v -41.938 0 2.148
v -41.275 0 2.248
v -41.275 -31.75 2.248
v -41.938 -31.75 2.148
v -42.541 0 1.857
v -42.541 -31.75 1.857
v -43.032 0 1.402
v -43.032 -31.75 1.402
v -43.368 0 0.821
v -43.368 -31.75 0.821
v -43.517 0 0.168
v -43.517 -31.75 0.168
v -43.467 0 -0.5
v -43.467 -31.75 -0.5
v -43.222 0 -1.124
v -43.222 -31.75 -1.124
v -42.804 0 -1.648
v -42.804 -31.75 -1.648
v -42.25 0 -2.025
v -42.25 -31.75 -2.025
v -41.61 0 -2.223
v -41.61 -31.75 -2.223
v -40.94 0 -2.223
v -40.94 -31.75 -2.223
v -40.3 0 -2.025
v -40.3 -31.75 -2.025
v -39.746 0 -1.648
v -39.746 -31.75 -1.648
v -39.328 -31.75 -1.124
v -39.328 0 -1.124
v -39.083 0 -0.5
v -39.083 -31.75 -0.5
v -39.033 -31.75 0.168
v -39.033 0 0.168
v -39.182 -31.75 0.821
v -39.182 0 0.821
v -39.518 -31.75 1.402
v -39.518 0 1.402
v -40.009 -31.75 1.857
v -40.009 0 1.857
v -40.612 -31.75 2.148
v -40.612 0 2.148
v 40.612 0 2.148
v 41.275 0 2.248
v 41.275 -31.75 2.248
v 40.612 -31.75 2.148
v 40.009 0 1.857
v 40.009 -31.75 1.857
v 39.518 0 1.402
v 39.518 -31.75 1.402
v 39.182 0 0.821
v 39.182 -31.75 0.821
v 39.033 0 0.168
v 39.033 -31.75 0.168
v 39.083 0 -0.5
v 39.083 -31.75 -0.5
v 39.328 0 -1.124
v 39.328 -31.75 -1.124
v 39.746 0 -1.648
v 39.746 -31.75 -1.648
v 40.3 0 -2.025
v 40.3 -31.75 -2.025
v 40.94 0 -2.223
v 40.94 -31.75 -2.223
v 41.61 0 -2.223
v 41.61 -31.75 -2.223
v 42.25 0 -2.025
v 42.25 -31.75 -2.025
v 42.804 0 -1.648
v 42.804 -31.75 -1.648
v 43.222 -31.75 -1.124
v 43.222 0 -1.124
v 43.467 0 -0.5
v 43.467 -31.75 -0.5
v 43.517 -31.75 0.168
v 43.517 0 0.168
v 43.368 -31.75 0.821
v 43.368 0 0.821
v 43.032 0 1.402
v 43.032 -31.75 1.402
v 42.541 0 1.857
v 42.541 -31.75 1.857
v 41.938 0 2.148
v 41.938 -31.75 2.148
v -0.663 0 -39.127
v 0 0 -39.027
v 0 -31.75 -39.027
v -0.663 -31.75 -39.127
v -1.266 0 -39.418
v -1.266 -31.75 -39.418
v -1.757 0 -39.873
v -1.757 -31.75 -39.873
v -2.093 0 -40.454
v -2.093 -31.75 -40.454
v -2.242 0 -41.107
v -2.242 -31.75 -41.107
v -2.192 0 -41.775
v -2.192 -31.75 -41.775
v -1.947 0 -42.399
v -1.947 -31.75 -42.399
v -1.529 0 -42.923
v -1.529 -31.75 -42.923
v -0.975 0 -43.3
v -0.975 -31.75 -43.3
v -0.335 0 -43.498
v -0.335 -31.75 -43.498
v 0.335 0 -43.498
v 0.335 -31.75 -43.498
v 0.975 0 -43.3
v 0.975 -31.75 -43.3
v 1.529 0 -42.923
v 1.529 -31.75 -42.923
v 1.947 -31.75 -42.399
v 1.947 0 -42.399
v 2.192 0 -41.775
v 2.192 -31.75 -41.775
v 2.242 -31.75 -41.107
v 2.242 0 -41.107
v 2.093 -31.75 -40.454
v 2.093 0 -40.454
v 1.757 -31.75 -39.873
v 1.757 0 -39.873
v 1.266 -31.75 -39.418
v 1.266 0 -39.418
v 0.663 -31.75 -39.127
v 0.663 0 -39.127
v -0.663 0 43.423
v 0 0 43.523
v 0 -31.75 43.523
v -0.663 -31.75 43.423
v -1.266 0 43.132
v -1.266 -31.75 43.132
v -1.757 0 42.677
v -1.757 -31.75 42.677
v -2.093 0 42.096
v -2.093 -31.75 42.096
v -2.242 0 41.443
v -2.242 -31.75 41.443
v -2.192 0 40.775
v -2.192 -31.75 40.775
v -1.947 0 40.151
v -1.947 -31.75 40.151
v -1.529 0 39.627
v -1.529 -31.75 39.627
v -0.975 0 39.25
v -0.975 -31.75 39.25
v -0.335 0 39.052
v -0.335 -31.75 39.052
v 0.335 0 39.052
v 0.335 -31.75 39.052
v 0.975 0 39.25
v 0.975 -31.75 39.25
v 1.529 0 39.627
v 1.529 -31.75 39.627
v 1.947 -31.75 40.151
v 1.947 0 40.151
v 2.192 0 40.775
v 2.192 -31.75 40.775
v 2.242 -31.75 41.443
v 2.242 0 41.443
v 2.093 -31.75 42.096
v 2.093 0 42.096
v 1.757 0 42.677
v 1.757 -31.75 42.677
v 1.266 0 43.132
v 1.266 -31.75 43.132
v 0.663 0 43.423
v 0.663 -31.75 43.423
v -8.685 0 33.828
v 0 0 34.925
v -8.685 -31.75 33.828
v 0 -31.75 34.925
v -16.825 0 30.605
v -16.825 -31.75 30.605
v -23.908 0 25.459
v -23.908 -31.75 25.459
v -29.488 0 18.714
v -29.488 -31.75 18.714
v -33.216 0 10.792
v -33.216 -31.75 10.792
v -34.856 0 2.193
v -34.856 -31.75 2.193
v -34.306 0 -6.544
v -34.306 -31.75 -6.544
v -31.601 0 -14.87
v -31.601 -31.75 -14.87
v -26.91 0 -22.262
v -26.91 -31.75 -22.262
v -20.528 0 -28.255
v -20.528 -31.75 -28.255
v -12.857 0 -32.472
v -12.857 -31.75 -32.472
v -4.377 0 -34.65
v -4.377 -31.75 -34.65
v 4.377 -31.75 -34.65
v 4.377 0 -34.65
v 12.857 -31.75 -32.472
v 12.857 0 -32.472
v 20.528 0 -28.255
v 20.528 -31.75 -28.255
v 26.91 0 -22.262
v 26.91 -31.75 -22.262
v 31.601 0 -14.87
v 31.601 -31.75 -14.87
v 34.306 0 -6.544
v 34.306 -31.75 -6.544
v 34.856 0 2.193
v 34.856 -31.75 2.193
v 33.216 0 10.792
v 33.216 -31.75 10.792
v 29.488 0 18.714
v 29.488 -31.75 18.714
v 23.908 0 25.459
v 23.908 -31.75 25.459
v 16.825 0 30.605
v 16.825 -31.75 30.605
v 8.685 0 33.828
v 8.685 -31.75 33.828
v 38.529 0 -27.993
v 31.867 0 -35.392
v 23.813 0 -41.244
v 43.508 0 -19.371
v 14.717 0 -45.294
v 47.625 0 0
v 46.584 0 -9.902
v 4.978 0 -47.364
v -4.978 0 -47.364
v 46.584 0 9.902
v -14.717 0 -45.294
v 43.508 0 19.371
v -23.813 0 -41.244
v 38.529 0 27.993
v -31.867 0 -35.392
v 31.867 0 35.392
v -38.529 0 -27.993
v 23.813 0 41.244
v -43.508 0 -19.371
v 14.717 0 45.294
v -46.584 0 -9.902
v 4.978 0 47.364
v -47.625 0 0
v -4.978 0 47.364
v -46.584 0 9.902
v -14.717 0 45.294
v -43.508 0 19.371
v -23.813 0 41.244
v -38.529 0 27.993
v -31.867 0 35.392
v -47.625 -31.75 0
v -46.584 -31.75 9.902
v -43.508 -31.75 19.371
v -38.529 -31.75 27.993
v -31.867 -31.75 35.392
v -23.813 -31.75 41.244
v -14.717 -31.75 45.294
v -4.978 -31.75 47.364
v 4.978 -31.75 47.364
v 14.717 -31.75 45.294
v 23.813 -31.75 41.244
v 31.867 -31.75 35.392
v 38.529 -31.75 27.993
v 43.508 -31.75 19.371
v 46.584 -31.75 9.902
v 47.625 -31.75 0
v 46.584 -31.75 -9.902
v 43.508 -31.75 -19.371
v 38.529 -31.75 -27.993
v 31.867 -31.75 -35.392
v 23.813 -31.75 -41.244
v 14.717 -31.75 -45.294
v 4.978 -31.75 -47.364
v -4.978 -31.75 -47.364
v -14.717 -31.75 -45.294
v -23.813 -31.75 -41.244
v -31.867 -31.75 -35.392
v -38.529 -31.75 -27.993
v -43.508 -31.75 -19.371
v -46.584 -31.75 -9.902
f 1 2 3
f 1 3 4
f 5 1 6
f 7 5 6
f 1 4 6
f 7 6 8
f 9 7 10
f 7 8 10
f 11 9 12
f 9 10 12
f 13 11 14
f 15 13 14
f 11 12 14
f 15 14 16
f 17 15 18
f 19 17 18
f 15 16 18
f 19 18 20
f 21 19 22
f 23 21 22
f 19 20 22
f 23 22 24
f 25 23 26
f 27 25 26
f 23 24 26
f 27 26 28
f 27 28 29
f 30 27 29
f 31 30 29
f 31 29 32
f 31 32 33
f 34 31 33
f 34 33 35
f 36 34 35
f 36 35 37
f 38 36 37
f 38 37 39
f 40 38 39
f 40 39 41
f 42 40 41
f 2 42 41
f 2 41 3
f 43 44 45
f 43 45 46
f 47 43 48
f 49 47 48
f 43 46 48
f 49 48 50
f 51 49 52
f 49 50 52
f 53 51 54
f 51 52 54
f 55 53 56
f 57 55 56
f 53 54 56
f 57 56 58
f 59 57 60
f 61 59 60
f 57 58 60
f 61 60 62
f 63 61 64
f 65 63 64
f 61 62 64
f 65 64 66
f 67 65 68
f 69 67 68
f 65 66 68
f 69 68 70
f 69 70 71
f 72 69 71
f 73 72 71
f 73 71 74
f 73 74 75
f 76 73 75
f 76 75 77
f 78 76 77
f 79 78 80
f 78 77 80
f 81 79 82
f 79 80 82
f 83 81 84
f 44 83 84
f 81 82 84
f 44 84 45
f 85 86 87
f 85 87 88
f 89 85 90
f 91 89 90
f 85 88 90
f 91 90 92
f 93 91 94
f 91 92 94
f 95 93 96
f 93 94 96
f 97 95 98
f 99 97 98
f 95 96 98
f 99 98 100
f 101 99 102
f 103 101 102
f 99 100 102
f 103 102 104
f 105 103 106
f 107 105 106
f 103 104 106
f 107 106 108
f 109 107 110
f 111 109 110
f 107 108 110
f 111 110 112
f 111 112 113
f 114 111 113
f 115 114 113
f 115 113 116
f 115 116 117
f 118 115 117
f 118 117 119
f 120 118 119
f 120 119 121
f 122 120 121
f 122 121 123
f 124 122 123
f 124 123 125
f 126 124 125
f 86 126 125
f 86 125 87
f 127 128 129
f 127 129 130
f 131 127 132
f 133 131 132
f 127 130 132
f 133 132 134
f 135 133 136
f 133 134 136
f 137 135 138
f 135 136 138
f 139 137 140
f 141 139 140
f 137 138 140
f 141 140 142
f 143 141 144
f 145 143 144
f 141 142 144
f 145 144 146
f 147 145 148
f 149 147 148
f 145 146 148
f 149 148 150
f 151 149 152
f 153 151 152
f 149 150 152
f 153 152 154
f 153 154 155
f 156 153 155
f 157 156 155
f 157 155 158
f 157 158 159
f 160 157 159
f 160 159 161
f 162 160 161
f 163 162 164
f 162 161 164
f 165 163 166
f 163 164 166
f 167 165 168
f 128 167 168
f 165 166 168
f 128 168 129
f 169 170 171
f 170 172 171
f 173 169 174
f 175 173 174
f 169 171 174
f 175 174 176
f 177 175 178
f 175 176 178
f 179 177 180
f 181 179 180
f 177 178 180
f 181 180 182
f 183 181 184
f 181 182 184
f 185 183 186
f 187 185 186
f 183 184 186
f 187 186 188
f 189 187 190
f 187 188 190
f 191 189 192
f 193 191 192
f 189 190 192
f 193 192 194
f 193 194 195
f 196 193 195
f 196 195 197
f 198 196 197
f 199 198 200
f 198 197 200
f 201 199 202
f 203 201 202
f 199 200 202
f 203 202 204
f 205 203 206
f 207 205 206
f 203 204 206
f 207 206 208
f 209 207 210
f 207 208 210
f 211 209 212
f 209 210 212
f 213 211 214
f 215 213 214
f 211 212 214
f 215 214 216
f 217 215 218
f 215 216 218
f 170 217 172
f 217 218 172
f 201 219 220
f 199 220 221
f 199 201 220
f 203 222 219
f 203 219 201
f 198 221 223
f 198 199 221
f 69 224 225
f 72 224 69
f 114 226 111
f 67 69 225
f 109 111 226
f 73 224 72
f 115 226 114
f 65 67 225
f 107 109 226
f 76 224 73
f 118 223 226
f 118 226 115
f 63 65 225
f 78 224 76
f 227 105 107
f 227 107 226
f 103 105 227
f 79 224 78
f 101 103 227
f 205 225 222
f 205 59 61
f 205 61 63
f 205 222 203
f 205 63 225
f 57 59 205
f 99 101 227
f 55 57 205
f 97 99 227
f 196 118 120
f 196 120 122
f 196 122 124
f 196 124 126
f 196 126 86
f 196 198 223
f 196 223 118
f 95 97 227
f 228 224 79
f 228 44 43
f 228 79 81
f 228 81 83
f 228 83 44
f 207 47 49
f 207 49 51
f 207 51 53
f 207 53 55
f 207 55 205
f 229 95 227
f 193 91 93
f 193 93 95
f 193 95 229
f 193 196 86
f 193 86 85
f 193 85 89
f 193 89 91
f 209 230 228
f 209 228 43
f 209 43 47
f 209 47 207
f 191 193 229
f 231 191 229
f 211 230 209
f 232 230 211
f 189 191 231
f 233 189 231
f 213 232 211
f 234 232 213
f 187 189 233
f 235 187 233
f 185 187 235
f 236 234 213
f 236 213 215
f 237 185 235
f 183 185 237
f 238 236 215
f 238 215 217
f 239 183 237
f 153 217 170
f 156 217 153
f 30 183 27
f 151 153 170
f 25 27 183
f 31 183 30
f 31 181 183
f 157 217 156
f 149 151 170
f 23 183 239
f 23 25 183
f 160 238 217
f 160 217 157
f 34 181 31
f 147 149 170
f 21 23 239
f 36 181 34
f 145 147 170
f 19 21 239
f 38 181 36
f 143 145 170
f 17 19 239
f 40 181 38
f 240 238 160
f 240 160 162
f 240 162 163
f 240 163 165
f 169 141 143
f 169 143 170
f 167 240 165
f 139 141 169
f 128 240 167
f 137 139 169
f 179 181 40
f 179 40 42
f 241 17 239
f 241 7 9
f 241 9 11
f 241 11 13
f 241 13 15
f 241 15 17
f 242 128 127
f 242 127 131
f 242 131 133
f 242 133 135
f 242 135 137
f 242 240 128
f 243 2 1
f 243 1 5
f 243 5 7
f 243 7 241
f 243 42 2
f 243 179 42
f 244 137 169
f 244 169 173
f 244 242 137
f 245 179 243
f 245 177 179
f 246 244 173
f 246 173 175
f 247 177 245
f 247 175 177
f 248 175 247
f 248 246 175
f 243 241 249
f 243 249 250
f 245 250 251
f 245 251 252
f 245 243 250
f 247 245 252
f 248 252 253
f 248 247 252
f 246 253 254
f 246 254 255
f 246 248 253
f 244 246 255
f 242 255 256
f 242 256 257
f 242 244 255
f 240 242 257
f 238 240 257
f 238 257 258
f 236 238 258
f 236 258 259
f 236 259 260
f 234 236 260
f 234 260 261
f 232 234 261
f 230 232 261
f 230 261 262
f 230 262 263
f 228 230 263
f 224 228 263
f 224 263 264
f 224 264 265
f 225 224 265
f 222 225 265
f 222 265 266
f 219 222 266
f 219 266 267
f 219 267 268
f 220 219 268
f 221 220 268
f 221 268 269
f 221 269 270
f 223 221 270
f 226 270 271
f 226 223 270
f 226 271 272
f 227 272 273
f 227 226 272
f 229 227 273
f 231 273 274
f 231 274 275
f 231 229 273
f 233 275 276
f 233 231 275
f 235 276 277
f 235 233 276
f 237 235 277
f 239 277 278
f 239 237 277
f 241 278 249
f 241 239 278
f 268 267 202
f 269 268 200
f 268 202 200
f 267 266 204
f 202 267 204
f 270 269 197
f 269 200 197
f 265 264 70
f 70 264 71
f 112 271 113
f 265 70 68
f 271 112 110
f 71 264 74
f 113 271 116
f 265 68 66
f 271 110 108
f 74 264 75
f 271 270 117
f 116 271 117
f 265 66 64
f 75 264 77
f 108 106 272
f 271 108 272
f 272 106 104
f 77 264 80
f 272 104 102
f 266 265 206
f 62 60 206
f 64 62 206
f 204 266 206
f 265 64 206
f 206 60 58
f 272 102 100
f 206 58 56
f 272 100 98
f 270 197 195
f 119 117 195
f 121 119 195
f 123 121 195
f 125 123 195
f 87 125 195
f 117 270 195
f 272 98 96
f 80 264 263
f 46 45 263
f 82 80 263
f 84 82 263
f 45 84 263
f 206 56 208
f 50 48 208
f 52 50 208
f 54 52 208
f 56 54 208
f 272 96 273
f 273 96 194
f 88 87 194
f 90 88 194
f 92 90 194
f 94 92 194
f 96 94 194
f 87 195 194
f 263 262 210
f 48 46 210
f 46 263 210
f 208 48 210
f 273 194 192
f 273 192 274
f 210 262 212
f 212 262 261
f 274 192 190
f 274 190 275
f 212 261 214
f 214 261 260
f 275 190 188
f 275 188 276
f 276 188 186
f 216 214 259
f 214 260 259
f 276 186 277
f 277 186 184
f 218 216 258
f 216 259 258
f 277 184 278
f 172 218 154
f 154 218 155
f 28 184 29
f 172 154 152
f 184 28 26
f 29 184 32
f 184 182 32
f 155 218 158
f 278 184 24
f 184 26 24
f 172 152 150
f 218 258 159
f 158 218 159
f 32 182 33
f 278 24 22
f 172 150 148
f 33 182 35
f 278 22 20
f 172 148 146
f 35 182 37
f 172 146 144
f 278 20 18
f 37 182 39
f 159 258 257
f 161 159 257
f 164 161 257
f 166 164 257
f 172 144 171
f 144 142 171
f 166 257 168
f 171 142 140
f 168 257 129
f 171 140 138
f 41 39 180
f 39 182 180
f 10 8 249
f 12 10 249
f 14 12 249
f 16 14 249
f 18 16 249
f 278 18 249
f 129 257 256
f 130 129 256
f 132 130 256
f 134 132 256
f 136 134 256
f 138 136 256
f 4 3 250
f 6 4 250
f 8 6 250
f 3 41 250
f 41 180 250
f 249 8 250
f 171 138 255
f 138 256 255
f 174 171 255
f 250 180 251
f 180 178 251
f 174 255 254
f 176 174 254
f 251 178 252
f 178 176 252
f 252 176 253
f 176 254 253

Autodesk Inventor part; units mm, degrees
ref_plane "YZ Plane" through (0, 0, 0) normal (1, 0, 0) x (0, 1, 0)
ref_plane "XZ Plane" through (0, 0, 0) normal (0, 1, 0) x (-1, 0, 0)
ref_plane "XY Plane" through (0, 0, 0) normal (0, 0, 1) x (1, 0, 0)
sketch "Sketch1" plane through (0, 0, 0) normal (0, 1, 0) x (-1, 0, 0)
  circle A0 centre (0, 0) radius 47.625
  circle A1 centre (0, 0) radius 41.275 construction
  point P0 (41.275, 0)
  point P1 (0, -41.275)
  point P2 (-41.275, 0)
  point P3 (0, 41.275)
  dimension "d0" = 95.25
  dimension "d1" = 82.55
extrude "Extrusion1" add sketch "Sketch1" against normal blind 31.75
hole "Hole1" at (-41.275, 0, 0) at (0, 0, -41.275) at (41.275, 0, 0) at (0, 0, 41.275) direction (0, -1, 0) diameter 4.4958 end through all clearance for "Flat Head Machine Screw" size "M4" standard "Ansi Metric M Profile"
sketch "Sketch2" plane through (0, 0, 0) normal (0, 1, 0) x (1, 0, 0)
  point P0 (0, 0)
  point P1 (-0.2961, 4.5812)
hole "Hole2" at (0, 0, 0) direction (0, -1, 0) diameter 69.85 end through all
sketch "Sketch3" plane through (0, -31.75, 0) normal (0, -1, 0) x (1, 0, 0)
  circle A0 centre (0, 41.275) radius 2.2479 projected
  circle A1 centre (-41.275, 0) radius 2.2479 projected
  circle A2 centre (0, -41.275) radius 2.2479 projected
  circle A3 centre (41.275, 0) radius 2.2479 projected
  circle A4 centre (0, 41.275) radius 7.62
  circle A5 centre (-41.275, 0) radius 7.62
  circle A6 centre (0, -41.275) radius 7.62
  circle A7 centre (41.275, 0) radius 7.62
  point P0 (0, 0)
  dimension "d18" = 15.24
properties material "ABS, BLACK"
